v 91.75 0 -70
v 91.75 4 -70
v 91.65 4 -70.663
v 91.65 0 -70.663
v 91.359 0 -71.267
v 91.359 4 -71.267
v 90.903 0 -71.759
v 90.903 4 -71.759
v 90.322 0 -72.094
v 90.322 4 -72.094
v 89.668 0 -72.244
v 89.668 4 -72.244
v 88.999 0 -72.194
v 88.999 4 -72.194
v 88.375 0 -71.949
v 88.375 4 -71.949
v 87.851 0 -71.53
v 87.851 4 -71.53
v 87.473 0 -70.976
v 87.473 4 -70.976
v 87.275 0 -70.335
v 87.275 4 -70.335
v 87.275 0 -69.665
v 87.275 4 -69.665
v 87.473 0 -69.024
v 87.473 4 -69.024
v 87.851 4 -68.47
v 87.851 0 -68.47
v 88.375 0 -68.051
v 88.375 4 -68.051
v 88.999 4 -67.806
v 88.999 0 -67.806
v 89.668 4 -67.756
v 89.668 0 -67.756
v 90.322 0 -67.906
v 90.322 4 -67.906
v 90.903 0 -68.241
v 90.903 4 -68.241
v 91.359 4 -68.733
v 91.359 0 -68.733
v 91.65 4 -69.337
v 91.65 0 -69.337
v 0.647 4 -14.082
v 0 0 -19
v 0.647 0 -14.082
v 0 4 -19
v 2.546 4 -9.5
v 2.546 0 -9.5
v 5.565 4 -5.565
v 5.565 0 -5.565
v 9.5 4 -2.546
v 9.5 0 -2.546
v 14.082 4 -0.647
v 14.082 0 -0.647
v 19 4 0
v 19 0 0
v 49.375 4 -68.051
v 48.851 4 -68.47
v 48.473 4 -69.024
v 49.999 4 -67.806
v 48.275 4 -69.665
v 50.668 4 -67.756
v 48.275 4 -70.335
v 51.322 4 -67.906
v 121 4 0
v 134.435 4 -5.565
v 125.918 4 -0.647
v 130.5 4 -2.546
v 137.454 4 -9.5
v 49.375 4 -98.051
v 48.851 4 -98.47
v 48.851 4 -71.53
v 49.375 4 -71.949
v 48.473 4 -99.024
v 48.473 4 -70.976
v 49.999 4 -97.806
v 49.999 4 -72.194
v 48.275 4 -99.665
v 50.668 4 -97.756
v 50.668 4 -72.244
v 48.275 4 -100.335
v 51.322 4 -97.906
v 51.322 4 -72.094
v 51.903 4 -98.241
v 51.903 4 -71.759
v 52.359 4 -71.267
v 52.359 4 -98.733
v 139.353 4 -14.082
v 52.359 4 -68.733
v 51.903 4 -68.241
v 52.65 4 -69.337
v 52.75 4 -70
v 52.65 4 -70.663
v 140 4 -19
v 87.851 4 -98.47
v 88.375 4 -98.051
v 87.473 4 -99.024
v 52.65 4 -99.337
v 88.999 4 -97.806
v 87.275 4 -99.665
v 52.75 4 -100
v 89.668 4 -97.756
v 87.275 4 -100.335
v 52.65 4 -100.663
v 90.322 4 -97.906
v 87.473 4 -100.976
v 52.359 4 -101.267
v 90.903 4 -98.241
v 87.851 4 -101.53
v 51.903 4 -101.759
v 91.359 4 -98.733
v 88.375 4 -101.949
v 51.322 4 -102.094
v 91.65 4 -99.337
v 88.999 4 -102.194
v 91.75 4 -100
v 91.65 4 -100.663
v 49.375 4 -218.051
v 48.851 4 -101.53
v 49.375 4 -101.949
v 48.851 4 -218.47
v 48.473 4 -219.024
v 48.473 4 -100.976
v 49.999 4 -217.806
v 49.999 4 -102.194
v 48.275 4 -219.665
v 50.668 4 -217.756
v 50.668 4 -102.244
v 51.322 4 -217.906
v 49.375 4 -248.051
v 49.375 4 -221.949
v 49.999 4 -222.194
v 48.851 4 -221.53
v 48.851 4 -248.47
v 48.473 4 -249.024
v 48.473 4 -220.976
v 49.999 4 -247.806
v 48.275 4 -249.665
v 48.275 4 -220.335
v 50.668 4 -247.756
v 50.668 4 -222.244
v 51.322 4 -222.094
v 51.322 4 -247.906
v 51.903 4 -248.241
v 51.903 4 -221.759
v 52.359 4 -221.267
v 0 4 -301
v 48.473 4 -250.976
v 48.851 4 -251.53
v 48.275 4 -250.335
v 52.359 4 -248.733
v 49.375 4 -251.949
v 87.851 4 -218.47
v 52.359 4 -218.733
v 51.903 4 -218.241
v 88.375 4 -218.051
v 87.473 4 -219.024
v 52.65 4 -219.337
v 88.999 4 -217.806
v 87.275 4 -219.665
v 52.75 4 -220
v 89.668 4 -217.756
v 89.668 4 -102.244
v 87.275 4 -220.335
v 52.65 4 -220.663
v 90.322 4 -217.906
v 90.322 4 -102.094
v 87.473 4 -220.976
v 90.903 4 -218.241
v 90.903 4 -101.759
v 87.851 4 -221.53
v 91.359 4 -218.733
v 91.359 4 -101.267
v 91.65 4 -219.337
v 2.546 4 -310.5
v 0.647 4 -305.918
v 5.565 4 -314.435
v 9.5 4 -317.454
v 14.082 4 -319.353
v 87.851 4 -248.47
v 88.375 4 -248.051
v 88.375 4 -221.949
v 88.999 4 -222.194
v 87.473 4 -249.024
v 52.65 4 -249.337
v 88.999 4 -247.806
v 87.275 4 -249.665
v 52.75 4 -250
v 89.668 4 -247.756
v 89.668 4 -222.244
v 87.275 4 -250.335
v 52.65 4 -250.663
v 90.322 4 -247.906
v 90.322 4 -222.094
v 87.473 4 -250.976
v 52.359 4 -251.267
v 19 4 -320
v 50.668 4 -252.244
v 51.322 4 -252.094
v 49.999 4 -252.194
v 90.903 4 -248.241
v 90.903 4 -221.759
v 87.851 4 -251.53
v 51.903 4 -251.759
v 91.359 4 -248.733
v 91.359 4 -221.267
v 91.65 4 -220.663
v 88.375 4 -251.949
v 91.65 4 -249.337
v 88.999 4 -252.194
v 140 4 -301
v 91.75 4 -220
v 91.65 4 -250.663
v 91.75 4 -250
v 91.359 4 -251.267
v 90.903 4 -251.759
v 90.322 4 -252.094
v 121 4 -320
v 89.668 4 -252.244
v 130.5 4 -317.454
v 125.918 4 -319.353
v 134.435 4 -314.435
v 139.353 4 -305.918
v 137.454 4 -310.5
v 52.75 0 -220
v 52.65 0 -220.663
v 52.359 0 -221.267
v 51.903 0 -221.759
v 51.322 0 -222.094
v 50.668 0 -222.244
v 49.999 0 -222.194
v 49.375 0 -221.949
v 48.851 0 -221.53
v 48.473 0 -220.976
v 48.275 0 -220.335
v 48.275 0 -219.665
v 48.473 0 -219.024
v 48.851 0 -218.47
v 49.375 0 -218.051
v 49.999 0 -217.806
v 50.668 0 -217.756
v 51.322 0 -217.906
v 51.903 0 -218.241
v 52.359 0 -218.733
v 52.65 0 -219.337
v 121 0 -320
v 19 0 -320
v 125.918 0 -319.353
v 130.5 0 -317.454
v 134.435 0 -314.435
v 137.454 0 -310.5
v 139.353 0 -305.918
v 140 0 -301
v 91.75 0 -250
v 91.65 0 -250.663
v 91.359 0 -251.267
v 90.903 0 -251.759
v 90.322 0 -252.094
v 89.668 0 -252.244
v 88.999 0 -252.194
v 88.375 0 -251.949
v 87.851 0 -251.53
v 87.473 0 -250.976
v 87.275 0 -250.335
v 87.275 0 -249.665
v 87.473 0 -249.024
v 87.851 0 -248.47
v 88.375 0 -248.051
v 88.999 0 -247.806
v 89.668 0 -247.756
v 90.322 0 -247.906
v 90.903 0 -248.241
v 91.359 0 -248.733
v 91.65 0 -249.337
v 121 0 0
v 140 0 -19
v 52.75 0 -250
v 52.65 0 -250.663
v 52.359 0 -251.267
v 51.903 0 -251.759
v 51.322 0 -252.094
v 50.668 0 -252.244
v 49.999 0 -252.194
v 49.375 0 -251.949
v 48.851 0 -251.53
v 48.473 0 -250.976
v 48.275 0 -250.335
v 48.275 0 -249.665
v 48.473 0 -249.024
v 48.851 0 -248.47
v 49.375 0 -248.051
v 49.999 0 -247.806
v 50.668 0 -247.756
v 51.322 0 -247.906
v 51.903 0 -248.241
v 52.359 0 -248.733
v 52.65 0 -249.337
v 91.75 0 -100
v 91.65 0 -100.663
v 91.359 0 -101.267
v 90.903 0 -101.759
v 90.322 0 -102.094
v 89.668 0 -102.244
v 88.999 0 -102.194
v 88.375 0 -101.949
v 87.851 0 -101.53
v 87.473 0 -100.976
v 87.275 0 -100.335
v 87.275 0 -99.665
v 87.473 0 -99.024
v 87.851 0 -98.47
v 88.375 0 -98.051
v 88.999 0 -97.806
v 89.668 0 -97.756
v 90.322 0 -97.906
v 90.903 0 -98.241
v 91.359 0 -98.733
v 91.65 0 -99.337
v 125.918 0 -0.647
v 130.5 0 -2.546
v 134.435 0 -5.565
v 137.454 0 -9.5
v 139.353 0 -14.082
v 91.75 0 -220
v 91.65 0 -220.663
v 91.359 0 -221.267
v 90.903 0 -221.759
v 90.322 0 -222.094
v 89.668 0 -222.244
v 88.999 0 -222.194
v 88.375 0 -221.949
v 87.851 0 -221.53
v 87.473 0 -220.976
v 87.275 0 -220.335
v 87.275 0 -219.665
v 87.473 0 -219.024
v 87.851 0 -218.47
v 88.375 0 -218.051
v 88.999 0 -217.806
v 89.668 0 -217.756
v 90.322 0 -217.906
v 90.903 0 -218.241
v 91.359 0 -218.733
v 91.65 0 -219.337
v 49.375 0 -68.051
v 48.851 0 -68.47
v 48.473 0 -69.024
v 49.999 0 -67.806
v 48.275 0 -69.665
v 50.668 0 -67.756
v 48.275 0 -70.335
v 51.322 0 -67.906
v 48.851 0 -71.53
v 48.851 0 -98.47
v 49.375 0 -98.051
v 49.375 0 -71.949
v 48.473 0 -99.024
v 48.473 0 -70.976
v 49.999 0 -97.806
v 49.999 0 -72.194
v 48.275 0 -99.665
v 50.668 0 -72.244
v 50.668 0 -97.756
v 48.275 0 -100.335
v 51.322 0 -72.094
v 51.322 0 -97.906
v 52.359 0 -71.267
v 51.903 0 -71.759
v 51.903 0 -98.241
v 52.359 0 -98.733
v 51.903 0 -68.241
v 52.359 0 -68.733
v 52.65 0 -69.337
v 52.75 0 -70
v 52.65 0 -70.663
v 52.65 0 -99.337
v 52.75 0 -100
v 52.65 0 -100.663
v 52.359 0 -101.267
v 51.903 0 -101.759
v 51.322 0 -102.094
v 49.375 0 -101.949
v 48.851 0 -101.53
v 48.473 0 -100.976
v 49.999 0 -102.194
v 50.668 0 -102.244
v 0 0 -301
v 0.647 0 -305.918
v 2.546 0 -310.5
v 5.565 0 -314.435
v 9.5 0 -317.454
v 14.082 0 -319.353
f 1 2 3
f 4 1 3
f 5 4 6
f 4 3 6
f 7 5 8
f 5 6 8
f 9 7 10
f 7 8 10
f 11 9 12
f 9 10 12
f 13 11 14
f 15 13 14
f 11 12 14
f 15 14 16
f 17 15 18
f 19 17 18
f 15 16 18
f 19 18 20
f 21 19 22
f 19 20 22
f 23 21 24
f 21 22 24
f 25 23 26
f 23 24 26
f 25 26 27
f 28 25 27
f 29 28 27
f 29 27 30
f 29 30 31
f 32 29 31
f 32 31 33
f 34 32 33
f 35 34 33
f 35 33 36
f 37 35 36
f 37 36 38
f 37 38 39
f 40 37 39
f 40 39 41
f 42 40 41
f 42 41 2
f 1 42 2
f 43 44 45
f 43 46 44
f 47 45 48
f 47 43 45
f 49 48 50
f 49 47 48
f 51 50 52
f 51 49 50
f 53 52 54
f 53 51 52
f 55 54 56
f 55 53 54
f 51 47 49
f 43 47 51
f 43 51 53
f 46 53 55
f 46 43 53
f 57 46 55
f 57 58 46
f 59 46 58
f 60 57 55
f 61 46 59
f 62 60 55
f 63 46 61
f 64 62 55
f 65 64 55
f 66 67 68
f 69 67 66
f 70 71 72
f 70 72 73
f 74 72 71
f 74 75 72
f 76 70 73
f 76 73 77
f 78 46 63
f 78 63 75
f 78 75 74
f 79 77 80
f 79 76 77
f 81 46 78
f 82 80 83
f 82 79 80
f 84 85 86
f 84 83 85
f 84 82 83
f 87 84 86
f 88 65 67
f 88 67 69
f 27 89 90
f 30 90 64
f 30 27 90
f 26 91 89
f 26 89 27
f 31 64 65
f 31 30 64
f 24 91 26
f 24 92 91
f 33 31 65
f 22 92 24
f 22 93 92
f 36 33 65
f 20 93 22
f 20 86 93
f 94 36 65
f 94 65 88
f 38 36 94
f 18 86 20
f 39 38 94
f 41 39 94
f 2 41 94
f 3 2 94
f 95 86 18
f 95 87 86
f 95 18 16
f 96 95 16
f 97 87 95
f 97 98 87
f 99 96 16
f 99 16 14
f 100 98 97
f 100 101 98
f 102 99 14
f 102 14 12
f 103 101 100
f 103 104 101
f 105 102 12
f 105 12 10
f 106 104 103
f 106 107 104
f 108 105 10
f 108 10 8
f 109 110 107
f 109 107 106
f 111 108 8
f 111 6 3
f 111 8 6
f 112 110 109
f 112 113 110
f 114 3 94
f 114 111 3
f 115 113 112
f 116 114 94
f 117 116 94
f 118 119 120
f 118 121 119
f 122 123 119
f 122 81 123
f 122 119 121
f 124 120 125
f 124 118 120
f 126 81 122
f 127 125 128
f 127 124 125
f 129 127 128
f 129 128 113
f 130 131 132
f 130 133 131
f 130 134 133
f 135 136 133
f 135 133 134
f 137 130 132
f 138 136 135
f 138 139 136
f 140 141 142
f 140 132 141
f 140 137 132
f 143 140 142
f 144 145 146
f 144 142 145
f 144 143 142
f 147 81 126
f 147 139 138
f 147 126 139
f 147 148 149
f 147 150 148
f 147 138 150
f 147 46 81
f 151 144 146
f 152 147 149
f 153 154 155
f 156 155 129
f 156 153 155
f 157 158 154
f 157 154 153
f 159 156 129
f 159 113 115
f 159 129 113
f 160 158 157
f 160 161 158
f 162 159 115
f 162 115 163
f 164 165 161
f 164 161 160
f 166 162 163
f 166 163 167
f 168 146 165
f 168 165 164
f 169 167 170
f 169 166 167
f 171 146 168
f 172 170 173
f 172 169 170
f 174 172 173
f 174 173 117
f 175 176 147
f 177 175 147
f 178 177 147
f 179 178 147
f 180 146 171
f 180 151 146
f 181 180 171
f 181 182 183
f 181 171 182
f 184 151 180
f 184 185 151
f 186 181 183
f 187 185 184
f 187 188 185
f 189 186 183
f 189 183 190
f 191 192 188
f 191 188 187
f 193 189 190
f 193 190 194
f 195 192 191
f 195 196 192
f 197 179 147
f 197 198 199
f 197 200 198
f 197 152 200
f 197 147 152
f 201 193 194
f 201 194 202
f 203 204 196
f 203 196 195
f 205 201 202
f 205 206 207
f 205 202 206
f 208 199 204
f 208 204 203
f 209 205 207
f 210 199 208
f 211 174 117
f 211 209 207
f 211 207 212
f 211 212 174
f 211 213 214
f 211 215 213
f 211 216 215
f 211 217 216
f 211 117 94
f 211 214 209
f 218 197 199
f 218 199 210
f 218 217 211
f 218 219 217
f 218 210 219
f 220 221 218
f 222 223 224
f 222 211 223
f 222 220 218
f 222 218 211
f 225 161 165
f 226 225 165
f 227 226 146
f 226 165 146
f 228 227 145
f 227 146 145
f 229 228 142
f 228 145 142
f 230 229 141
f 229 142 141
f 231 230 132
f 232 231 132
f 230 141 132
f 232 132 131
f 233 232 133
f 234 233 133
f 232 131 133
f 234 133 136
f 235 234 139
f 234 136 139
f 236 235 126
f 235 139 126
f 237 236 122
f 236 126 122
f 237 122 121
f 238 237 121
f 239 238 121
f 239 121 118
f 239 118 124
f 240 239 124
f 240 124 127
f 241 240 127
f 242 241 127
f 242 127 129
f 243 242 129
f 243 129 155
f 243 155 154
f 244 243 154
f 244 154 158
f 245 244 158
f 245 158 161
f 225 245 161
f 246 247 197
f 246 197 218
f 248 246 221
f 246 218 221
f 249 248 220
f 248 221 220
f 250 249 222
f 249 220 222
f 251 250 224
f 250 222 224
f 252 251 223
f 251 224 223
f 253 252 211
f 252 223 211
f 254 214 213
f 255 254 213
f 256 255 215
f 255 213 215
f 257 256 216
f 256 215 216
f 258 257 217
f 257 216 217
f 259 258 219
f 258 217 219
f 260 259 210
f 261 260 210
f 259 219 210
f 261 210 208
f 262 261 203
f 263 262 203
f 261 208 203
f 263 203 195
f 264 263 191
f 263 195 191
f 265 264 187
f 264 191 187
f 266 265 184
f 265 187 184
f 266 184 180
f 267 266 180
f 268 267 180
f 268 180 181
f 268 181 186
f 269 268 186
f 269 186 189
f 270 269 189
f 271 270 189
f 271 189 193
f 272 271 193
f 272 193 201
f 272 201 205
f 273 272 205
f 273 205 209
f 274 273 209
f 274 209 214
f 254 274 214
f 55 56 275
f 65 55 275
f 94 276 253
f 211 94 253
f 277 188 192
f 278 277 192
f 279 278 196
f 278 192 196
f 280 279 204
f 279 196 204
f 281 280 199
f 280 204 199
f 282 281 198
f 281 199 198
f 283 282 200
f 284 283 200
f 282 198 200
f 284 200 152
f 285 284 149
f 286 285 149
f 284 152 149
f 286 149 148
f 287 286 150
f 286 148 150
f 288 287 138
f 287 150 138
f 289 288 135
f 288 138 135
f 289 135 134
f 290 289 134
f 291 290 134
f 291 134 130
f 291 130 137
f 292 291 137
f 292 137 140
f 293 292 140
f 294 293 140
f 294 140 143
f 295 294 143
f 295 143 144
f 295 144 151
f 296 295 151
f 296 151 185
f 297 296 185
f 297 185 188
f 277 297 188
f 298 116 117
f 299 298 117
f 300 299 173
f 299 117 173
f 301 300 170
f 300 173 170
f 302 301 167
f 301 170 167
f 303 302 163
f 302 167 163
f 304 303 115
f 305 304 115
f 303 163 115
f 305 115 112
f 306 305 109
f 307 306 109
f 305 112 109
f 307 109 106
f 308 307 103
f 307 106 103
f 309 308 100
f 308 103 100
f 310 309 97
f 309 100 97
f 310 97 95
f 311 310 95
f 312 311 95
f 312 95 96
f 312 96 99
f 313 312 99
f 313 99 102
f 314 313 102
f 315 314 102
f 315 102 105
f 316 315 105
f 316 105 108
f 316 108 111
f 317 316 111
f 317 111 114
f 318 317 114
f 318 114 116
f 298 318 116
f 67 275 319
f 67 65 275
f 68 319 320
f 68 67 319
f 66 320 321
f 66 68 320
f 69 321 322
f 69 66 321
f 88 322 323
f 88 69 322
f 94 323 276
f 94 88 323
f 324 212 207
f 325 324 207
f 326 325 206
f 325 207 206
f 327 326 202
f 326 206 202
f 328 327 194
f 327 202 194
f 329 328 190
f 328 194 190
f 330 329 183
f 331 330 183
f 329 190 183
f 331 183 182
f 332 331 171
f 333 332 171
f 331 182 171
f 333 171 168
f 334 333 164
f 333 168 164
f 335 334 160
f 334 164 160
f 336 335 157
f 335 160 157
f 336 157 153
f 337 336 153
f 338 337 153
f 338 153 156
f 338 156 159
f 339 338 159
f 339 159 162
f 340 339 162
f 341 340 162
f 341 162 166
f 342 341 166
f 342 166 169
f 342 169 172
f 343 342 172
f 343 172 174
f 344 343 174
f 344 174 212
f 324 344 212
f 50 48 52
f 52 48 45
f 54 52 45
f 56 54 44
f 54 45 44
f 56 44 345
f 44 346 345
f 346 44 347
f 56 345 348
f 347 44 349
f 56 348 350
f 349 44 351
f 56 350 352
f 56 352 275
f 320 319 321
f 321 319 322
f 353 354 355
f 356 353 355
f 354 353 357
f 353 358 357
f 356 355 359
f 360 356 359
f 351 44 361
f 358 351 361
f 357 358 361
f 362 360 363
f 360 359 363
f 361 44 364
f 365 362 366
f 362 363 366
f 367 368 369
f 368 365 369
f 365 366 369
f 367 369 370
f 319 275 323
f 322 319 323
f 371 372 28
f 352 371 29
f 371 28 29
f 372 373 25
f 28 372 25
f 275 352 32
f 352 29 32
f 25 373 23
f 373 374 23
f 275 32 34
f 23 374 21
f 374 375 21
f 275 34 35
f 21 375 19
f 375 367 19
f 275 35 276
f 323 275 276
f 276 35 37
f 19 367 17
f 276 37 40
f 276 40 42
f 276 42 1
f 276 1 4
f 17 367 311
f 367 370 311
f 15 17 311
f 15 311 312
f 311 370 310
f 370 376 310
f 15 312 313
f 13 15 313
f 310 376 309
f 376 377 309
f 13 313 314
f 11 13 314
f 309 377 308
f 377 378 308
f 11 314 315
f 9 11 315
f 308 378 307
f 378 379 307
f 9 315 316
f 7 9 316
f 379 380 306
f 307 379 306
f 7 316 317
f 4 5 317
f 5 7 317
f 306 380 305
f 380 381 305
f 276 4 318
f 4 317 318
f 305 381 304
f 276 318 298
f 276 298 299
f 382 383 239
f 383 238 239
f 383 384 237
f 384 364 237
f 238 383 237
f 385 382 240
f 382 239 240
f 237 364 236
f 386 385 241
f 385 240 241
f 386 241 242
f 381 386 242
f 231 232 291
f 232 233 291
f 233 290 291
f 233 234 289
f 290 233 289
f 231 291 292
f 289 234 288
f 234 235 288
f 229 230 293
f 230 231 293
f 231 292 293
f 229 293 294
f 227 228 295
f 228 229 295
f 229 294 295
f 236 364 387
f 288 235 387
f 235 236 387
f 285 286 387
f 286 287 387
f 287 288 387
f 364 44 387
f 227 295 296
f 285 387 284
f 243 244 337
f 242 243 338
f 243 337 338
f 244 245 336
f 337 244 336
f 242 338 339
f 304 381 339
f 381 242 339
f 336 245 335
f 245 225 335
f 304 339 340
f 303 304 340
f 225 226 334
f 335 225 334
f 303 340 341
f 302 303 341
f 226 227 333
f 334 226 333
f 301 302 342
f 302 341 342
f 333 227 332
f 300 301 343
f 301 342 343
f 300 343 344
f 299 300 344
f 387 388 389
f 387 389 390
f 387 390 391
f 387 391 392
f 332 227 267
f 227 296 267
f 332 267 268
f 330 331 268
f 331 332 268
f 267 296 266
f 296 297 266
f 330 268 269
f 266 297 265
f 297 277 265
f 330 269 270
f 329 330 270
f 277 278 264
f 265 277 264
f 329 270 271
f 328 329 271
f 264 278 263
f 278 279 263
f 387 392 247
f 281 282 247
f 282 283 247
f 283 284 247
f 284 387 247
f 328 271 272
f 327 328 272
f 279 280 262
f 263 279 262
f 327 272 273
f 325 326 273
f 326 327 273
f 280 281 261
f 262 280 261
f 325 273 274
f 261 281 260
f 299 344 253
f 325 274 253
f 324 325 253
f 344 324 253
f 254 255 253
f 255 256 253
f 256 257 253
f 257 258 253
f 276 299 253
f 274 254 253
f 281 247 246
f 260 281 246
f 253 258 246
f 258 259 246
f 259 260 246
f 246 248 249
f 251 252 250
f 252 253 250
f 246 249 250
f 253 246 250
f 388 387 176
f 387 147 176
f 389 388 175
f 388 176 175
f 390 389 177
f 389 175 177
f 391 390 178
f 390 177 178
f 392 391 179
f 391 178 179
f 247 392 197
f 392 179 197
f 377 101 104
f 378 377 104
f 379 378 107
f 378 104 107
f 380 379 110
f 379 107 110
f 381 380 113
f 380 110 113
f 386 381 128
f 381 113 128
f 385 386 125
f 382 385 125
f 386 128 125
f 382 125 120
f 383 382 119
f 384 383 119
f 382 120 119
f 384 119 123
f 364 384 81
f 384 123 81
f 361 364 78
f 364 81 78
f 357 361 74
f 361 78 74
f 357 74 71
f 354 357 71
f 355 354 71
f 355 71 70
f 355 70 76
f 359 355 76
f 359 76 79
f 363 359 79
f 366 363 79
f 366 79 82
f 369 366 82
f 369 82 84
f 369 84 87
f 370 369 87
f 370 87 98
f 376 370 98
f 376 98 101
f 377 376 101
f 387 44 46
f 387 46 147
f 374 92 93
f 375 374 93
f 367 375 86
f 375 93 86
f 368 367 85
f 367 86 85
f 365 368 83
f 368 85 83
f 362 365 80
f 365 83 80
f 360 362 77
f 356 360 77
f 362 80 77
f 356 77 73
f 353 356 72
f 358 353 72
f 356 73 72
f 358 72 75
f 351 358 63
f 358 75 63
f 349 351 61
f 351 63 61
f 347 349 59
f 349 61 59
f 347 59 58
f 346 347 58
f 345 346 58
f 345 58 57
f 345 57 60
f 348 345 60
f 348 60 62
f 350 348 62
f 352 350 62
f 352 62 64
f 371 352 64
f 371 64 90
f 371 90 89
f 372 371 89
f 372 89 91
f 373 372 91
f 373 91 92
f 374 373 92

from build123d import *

# Parameters (mm, degrees)
SKETCH1_W           = 140
SKETCH1_H           = 320
BOSS_EXTRUDE1_DEPTH = 4
CUT_EXTRUDE1_REACH  = 6
SKETCH2_R           = 2.25
FILLET1_R           = 19


with BuildPart() as part:
    # Sketch1 → Boss-Extrude1 (new body)
    with BuildSketch(Plane(origin=(0, 0, 0), x_dir=(1, 0, 0), z_dir=(0, 1, 0))):
        with Locations((70, 160)):
            Rectangle(SKETCH1_W, SKETCH1_H)
    extrude(amount=BOSS_EXTRUDE1_DEPTH)

    # Sketch2 → Cut-Extrude1 (cut, up to next)
    with BuildSketch(Plane(origin=(0, 4, 0), x_dir=(1, 0, 0), z_dir=(0, 1, 0)), mode=Mode.PRIVATE) as cut_extrude1_sk1:
        with Locations((89.5, 250)):
            Circle(SKETCH2_R)
    cut_extrude1_tool1 = extrude(cut_extrude1_sk1.sketch, amount=-CUT_EXTRUDE1_REACH, mode=Mode.PRIVATE) & part.part
    add(cut_extrude1_tool1.solids().sort_by_distance((89.5, 4, -250))[0], mode=Mode.SUBTRACT)
    # Sketch2 → Cut-Extrude1 (cut, up to next)
    with BuildSketch(Plane(origin=(0, 4, 0), x_dir=(1, 0, 0), z_dir=(0, 1, 0)), mode=Mode.PRIVATE) as cut_extrude1_sk2:
        with Locations((89.5, 220)):
            Circle(SKETCH2_R)
    cut_extrude1_tool2 = extrude(cut_extrude1_sk2.sketch, amount=-CUT_EXTRUDE1_REACH, mode=Mode.PRIVATE) & part.part
    add(cut_extrude1_tool2.solids().sort_by_distance((89.5, 4, -220))[0], mode=Mode.SUBTRACT)
    # Sketch2 → Cut-Extrude1 (cut, up to next)
    with BuildSketch(Plane(origin=(0, 4, 0), x_dir=(1, 0, 0), z_dir=(0, 1, 0)), mode=Mode.PRIVATE) as cut_extrude1_sk3:
        with Locations((89.5, 100)):
            Circle(SKETCH2_R)
    cut_extrude1_tool3 = extrude(cut_extrude1_sk3.sketch, amount=-CUT_EXTRUDE1_REACH, mode=Mode.PRIVATE) & part.part
    add(cut_extrude1_tool3.solids().sort_by_distance((89.5, 4, -100))[0], mode=Mode.SUBTRACT)
    # Sketch2 → Cut-Extrude1 (cut, up to next)
    with BuildSketch(Plane(origin=(0, 4, 0), x_dir=(1, 0, 0), z_dir=(0, 1, 0)), mode=Mode.PRIVATE) as cut_extrude1_sk4:
        with Locations((89.5, 70)):
            Circle(SKETCH2_R)
    cut_extrude1_tool4 = extrude(cut_extrude1_sk4.sketch, amount=-CUT_EXTRUDE1_REACH, mode=Mode.PRIVATE) & part.part
    add(cut_extrude1_tool4.solids().sort_by_distance((89.5, 4, -70))[0], mode=Mode.SUBTRACT)
    # Sketch2 → Cut-Extrude1 (cut, up to next)
    with BuildSketch(Plane(origin=(0, 4, 0), x_dir=(1, 0, 0), z_dir=(0, 1, 0)), mode=Mode.PRIVATE) as cut_extrude1_sk5:
        with Locations((50.5, 70)):
            Circle(SKETCH2_R)
    cut_extrude1_tool5 = extrude(cut_extrude1_sk5.sketch, amount=-CUT_EXTRUDE1_REACH, mode=Mode.PRIVATE) & part.part
    add(cut_extrude1_tool5.solids().sort_by_distance((50.5, 4, -70))[0], mode=Mode.SUBTRACT)
    # Sketch2 → Cut-Extrude1 (cut, up to next)
    with BuildSketch(Plane(origin=(0, 4, 0), x_dir=(1, 0, 0), z_dir=(0, 1, 0)), mode=Mode.PRIVATE) as cut_extrude1_sk6:
        with Locations((50.5, 100)):
            Circle(SKETCH2_R)
    cut_extrude1_tool6 = extrude(cut_extrude1_sk6.sketch, amount=-CUT_EXTRUDE1_REACH, mode=Mode.PRIVATE) & part.part
    add(cut_extrude1_tool6.solids().sort_by_distance((50.5, 4, -100))[0], mode=Mode.SUBTRACT)
    # Sketch2 → Cut-Extrude1 (cut, up to next)
    with BuildSketch(Plane(origin=(0, 4, 0), x_dir=(1, 0, 0), z_dir=(0, 1, 0)), mode=Mode.PRIVATE) as cut_extrude1_sk7:
        with Locations((50.5, 220)):
            Circle(SKETCH2_R)
    cut_extrude1_tool7 = extrude(cut_extrude1_sk7.sketch, amount=-CUT_EXTRUDE1_REACH, mode=Mode.PRIVATE) & part.part
    add(cut_extrude1_tool7.solids().sort_by_distance((50.5, 4, -220))[0], mode=Mode.SUBTRACT)
    # Sketch2 → Cut-Extrude1 (cut, up to next)
    with BuildSketch(Plane(origin=(0, 4, 0), x_dir=(1, 0, 0), z_dir=(0, 1, 0)), mode=Mode.PRIVATE) as cut_extrude1_sk8:
        with Locations((50.5, 250)):
            Circle(SKETCH2_R)
    cut_extrude1_tool8 = extrude(cut_extrude1_sk8.sketch, amount=-CUT_EXTRUDE1_REACH, mode=Mode.PRIVATE) & part.part
    add(cut_extrude1_tool8.solids().sort_by_distance((50.5, 4, -250))[0], mode=Mode.SUBTRACT)

    # Fillet1
    fillet1_edges = [part.edges().sort_by_distance(p)[0] for p in [
        (0, 2, -320),
        (140, 2, -320),
        (140, 2, 0),
        (0, 2, 0),
    ]]
    fillet(fillet1_edges, radius=FILLET1_R)


solid = part.part
